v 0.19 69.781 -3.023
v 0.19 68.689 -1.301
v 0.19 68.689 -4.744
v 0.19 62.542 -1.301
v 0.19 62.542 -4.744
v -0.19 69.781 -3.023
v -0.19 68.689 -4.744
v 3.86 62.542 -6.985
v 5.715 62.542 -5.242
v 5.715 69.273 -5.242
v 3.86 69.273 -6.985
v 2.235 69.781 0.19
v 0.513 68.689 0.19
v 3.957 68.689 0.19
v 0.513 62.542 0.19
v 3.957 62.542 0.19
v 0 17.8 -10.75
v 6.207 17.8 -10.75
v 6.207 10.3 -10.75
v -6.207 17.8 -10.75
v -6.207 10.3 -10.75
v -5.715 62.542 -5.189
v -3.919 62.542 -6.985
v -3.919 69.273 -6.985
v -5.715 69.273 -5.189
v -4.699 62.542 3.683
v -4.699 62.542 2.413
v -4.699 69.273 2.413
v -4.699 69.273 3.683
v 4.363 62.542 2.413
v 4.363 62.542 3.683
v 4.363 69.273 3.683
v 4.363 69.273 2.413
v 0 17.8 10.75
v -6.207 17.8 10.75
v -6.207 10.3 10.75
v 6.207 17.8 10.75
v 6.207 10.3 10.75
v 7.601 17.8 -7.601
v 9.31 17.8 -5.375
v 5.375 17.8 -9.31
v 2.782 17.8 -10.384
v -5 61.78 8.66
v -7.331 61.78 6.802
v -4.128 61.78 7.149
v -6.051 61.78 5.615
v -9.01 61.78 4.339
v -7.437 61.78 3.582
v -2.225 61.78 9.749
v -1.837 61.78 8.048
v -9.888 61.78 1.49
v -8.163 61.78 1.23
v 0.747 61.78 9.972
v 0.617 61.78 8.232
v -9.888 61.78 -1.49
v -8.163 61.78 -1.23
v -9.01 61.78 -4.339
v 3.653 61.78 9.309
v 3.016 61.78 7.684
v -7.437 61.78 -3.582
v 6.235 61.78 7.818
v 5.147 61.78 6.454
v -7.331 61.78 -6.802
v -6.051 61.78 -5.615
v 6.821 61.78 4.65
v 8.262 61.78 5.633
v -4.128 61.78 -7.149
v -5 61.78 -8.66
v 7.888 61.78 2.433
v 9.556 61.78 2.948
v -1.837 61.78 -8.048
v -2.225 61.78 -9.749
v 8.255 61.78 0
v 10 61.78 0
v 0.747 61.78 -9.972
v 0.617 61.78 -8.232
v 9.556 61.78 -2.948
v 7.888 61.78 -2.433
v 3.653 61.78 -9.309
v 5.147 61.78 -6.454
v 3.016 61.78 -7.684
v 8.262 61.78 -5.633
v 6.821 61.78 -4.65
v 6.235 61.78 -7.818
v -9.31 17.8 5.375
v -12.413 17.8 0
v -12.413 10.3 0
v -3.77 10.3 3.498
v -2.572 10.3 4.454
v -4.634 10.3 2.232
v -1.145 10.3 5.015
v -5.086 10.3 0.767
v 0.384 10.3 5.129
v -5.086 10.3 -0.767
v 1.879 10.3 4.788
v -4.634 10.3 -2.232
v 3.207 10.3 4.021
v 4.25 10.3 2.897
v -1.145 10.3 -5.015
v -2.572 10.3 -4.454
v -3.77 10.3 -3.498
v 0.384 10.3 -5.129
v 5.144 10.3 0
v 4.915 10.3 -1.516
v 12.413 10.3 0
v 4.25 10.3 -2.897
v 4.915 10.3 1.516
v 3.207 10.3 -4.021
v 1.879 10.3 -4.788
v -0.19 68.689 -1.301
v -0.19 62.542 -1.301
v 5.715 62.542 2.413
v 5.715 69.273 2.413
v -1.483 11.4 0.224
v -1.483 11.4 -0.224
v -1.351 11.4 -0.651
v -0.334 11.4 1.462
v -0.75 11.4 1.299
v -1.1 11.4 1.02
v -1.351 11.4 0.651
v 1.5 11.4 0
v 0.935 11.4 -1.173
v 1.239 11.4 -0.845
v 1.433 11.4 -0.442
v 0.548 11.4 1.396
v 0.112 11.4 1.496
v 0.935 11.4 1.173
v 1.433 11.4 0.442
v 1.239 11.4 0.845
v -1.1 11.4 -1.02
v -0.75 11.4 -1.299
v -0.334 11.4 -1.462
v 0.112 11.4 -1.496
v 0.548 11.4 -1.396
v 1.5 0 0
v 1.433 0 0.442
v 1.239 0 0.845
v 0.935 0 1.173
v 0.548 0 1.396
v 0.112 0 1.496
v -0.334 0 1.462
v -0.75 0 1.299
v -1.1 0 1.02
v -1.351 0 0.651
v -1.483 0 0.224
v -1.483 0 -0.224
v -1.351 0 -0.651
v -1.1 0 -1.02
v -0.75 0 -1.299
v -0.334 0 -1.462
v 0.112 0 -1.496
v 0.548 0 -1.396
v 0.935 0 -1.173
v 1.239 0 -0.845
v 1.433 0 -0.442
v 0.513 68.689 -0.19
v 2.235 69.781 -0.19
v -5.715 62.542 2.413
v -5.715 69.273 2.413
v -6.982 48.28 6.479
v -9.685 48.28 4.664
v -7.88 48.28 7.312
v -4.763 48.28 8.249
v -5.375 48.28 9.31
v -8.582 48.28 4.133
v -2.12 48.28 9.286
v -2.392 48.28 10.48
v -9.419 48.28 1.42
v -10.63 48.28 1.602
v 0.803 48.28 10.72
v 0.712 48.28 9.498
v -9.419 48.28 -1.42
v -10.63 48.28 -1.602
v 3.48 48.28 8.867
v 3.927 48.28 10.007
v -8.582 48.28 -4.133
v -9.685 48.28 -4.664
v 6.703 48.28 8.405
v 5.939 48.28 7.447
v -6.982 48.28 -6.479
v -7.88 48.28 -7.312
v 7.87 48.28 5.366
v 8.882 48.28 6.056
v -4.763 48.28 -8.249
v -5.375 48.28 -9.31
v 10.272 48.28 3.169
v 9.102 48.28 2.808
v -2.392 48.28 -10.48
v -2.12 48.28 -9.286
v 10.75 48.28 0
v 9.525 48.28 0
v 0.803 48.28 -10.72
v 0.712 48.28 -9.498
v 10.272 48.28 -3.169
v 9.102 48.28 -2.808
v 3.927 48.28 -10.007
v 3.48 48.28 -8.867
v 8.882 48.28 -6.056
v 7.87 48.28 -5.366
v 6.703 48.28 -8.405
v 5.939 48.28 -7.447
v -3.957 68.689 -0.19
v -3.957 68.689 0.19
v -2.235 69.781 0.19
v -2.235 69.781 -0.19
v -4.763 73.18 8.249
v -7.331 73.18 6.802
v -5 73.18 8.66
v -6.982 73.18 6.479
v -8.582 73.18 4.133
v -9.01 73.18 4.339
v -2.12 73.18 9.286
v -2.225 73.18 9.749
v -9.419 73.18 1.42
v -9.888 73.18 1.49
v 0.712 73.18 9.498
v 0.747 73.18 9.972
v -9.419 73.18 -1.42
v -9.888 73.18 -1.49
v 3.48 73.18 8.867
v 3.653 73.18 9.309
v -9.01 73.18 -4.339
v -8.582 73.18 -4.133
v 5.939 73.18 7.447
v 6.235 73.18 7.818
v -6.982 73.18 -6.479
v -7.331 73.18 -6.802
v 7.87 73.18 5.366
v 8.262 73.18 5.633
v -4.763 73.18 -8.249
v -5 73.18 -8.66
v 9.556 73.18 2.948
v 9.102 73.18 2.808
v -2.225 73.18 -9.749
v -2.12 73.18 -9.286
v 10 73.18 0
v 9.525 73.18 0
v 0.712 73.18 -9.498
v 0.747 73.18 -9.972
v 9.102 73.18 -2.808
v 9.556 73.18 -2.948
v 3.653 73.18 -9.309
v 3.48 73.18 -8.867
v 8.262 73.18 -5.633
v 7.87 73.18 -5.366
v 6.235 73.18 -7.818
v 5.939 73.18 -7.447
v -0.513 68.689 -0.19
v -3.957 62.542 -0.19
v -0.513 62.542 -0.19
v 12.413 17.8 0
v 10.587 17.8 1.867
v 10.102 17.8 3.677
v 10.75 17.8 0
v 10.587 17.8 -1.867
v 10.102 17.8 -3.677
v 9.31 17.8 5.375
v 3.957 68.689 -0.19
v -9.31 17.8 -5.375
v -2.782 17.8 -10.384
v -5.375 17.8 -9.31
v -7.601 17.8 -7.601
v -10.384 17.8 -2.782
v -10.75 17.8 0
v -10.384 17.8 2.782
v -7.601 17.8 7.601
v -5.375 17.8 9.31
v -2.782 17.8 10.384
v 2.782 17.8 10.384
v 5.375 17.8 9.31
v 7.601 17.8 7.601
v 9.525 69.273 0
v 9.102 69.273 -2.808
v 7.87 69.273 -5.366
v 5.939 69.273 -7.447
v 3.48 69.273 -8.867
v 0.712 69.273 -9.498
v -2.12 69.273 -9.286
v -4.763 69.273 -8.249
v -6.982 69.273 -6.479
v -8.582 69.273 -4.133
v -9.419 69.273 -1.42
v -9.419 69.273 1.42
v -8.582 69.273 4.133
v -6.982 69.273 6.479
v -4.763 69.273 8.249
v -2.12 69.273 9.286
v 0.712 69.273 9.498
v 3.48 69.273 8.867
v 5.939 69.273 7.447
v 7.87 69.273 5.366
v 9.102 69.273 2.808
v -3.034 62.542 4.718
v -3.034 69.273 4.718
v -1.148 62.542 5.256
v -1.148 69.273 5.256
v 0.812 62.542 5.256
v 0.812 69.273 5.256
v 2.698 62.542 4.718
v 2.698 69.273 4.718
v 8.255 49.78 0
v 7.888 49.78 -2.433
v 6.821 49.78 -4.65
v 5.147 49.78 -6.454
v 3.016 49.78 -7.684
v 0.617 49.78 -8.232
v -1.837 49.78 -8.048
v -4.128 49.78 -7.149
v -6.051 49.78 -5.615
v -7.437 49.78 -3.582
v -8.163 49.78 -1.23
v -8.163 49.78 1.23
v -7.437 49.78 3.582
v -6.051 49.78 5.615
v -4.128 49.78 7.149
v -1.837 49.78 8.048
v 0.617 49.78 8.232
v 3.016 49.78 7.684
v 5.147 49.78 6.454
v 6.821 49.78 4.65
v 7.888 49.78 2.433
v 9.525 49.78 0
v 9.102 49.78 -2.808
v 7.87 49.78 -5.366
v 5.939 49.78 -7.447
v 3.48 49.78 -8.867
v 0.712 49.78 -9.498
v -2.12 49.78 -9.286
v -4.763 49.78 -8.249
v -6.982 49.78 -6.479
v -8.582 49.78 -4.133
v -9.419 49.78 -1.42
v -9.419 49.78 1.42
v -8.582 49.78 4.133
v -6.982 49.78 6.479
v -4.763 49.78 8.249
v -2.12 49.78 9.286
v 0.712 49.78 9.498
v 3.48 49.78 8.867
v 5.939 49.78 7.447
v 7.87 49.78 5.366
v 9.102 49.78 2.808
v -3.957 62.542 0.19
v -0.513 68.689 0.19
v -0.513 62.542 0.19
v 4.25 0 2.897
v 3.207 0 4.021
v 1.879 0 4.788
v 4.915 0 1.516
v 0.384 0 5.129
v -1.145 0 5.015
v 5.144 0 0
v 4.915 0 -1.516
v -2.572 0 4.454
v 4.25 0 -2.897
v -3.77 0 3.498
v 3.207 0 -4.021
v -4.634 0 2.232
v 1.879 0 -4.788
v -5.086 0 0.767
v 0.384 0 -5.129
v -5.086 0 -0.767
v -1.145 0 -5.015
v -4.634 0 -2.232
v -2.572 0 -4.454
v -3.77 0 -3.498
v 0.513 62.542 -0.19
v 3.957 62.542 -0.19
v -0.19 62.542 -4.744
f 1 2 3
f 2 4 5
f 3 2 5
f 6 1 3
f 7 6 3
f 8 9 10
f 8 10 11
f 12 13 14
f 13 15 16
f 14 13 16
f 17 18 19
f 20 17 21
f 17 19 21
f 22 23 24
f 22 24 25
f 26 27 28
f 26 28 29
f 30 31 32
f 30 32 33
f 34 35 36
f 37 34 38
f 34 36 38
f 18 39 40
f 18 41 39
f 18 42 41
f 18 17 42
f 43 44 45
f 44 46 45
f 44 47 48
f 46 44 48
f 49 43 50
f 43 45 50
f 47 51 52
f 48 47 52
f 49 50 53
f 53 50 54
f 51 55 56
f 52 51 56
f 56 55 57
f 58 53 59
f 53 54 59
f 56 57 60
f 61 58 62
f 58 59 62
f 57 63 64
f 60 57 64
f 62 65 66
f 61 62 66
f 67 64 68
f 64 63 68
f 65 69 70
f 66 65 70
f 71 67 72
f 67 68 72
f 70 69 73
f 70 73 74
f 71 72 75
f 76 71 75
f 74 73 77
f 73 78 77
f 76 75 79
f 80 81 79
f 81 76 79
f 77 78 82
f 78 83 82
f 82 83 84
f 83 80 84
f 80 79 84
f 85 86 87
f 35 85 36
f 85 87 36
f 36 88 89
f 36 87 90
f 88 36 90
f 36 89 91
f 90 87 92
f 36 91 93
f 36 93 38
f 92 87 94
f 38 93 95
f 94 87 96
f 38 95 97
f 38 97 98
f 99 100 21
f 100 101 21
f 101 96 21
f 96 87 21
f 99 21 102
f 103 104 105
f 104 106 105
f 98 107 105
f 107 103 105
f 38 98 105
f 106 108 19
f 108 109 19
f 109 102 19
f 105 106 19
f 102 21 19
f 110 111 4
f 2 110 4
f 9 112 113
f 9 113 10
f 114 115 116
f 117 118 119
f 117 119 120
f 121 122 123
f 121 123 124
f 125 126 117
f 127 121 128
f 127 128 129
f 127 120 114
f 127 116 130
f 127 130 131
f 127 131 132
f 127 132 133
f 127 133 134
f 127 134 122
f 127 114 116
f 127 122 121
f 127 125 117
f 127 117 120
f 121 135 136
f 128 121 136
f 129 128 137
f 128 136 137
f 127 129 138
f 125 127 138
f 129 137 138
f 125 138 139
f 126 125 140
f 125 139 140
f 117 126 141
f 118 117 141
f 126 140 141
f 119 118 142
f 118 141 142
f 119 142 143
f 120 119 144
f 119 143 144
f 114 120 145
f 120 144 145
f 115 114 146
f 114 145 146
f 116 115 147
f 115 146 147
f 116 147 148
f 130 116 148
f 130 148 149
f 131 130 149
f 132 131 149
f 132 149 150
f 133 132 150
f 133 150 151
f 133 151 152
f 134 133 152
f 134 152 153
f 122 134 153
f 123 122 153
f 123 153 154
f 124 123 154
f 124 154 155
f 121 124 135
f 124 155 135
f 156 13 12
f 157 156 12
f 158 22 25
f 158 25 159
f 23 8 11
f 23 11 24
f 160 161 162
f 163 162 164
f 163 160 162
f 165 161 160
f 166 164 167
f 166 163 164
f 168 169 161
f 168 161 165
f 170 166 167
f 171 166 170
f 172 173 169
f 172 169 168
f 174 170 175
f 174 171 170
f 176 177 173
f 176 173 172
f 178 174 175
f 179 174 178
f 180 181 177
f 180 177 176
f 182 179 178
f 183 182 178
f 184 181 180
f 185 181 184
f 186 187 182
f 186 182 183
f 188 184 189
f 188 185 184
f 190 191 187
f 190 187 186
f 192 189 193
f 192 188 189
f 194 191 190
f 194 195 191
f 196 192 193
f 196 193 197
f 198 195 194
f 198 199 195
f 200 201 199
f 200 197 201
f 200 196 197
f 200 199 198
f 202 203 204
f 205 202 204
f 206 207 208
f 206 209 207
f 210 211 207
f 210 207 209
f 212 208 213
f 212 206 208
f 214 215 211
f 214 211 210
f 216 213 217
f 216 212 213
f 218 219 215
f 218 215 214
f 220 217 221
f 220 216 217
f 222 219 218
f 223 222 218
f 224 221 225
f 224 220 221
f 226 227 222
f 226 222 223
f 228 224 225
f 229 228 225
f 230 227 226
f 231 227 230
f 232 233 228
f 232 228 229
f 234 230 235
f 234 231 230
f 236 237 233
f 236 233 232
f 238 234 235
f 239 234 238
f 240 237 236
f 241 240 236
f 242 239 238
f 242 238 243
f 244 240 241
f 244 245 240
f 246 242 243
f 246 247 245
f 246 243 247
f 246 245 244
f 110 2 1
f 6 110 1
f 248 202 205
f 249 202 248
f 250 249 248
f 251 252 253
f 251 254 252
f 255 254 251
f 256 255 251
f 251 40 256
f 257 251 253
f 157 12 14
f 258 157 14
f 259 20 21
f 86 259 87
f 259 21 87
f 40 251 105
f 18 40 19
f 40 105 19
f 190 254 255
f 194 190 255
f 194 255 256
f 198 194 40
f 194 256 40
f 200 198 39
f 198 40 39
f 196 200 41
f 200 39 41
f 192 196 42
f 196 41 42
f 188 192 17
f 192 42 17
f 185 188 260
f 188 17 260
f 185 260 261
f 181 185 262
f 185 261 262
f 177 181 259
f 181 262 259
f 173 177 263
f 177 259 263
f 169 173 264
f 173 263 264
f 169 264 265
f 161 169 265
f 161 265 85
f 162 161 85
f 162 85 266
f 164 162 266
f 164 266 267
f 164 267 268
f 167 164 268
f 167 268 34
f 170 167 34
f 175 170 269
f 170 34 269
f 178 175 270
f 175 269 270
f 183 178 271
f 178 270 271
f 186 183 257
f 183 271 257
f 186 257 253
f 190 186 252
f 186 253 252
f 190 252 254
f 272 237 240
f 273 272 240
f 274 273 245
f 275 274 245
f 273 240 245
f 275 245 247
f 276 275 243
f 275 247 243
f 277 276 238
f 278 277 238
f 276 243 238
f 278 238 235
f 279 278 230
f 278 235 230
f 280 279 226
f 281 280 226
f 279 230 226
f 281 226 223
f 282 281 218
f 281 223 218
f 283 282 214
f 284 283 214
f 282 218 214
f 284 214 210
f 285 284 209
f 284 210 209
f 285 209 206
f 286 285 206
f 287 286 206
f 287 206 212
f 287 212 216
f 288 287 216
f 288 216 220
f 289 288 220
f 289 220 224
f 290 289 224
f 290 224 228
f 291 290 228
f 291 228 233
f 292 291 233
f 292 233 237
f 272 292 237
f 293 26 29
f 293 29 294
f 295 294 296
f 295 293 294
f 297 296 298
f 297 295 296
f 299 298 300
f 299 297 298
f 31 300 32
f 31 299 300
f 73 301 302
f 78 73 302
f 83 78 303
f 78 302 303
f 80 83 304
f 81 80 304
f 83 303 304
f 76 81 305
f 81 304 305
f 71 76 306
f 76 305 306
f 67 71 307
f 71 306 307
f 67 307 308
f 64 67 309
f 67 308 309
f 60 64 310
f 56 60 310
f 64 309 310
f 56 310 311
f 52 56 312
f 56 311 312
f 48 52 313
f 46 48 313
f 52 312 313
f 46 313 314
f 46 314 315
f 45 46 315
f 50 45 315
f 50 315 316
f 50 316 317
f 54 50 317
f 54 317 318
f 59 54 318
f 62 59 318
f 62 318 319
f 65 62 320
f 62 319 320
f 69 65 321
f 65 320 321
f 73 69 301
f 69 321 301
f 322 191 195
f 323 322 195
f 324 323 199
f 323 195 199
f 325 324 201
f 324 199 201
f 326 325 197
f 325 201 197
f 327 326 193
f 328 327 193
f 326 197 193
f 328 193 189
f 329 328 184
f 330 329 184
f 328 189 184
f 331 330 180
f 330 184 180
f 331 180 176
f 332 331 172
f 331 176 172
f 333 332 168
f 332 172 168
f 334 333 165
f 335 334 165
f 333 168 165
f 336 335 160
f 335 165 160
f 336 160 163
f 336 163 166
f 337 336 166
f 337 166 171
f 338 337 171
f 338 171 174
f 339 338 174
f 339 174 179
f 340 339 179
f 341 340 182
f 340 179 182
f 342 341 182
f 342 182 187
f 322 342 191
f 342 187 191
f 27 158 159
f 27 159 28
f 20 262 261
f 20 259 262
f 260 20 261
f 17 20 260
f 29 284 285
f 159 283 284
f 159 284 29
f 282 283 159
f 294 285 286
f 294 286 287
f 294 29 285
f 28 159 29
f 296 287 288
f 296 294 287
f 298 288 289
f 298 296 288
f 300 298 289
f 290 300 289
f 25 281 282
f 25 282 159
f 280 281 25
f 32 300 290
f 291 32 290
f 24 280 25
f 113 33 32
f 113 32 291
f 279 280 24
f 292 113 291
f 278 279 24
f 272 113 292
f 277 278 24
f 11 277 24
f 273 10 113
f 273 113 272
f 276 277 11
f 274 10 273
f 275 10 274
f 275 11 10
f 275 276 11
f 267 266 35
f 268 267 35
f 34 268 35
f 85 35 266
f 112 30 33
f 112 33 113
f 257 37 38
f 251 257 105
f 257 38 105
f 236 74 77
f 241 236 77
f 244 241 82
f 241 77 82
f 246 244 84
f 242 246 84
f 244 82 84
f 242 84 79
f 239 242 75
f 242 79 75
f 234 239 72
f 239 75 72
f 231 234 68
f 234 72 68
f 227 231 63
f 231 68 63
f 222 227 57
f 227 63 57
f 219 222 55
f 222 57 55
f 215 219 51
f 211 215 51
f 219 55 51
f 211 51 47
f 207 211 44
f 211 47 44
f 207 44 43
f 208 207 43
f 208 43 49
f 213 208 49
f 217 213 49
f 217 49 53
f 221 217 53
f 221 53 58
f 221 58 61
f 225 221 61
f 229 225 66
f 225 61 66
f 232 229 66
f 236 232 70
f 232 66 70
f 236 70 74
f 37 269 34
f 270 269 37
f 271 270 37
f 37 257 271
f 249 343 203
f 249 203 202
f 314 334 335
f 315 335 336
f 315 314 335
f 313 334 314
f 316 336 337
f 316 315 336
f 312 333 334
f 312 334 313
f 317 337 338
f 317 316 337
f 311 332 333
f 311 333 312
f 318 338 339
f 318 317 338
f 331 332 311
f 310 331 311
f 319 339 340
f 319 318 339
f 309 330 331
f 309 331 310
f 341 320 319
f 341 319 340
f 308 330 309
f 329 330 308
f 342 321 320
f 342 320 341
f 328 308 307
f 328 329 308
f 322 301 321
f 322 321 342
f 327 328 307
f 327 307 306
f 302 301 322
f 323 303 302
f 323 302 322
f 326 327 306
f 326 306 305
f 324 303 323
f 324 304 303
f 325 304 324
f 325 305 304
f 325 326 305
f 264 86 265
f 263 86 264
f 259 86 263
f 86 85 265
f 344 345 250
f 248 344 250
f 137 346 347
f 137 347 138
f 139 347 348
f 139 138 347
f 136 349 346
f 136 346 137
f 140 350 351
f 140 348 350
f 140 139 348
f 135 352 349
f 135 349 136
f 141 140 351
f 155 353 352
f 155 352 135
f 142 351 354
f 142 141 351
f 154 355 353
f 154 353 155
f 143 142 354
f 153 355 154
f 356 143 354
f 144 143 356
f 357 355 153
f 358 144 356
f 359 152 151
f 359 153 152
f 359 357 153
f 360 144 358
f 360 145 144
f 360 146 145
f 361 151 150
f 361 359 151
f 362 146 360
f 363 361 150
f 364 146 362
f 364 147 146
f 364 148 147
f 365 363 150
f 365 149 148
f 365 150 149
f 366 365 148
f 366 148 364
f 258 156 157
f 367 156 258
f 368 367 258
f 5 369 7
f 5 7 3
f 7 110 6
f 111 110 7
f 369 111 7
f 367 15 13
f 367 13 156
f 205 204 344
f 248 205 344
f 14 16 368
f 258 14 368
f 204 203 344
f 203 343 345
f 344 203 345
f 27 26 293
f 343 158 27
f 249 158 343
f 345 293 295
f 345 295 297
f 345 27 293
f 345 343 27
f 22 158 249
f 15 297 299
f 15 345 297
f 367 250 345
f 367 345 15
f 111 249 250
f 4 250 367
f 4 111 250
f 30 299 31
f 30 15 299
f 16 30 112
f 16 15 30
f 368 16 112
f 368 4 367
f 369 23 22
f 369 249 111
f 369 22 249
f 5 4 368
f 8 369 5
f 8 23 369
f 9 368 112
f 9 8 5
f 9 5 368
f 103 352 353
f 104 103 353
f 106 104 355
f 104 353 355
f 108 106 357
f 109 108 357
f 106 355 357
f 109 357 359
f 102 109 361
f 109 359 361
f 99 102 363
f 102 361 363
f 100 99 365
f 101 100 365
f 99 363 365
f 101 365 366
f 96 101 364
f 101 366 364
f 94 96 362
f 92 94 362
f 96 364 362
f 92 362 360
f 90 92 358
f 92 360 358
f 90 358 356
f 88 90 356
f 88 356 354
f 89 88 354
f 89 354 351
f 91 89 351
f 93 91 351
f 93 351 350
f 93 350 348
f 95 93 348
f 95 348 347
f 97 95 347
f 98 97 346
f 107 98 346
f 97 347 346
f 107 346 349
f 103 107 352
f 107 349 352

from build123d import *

# Parameters (mm, degrees)
SKETCH1_R           = 5.1435
BOSS_EXTRUDE1_DEPTH = 10.3
BOSS_EXTRUDE2_DEPTH = 7.5
SKETCH3_R           = 10.75
BOSS_EXTRUDE3_DEPTH = 30.48
SKETCH4_R           = 9.525
BOSS_EXTRUDE4_DEPTH = 1.5
SKETCH5_R           = 8.255
BOSS_EXTRUDE5_DEPTH = 12
SKETCH6_R           = 10
BOSS_EXTRUDE6_DEPTH = 11.4
SKETCH7_R           = 4.3053
CUT_EXTRUDE1_DEPTH  = 11.4
SKETCH28_R          = 4.3053
BOSS_EXTRUDE7_DEPTH = 11.4
SKETCH29_R          = 1.5
CUT_EXTRUDE2_DEPTH  = 11.4
SKETCH30_R          = 9.525
CUT_EXTRUDE6_DEPTH  = 10.638
SKETCH31_W          = 0.381
SKETCH31_H          = 3.44369911
SKETCH31_W_2        = 3.44369911
SKETCH31_H_2        = 0.381
BOSS_EXTRUDE8_DEPTH = 7.239
CUT_EXTRUDE7_DEPTH  = 6.731
CUT_EXTRUDE8_DEPTH  = 1.651
CUT_EXTRUDE9_DEPTH  = 1.651
SKETCH35_R          = 9.525
BOSS_EXTRUDE9_DEPTH = 6.731


with BuildPart() as part:
    # Sketch1 → Boss-Extrude1 (new body)
    with BuildSketch(Plane(origin=(0, 0, 0), x_dir=(1, 0, 0), z_dir=(0, 1, 0))):
        Circle(SKETCH1_R)
    extrude(amount=BOSS_EXTRUDE1_DEPTH)

    # Sketch2 → Boss-Extrude2 (add)
    with BuildSketch(Plane(origin=(0, 10.3, 0), x_dir=(1, 0, 0), z_dir=(0, 1, 0))):
        Polygon((6.206515394, 10.75), (-6.206515394, 10.75), (-12.413030788, 0), (-6.206515394, -10.75), (6.206515394, -10.75), (12.413030788, 0), align=None)
    extrude(amount=BOSS_EXTRUDE2_DEPTH)

    # Sketch3 → Boss-Extrude3 (add)
    with BuildSketch(Plane(origin=(0, 17.8, 0), x_dir=(1, 0, 0), z_dir=(0, 1, 0))):
        Circle(SKETCH3_R)
    extrude(amount=BOSS_EXTRUDE3_DEPTH)

    # Sketch4 → Boss-Extrude4 (add)
    with BuildSketch(Plane(origin=(0, 48.28, 0), x_dir=(1, 0, 0), z_dir=(0, 1, 0))):
        Circle(SKETCH4_R)
    extrude(amount=BOSS_EXTRUDE4_DEPTH)

    # Sketch5 → Boss-Extrude5 (add)
    with BuildSketch(Plane(origin=(0, 49.78, 0), x_dir=(1, 0, 0), z_dir=(0, 1, 0))):
        Circle(SKETCH5_R)
    extrude(amount=BOSS_EXTRUDE5_DEPTH)

    # Sketch6 → Boss-Extrude6 (add)
    with BuildSketch(Plane(origin=(0, 61.78, 0), x_dir=(1, 0, 0), z_dir=(0, 1, 0))):
        Circle(SKETCH6_R)
    extrude(amount=BOSS_EXTRUDE6_DEPTH)

    # Sketch7 → Cut-Extrude1 (cut)
    with BuildSketch(Plane.XZ):
        Circle(SKETCH7_R)
    extrude(amount=-CUT_EXTRUDE1_DEPTH, mode=Mode.SUBTRACT)

    # Sketch28 → Boss-Extrude7 (add)
    with BuildSketch(Plane(origin=(0, 0, 0), x_dir=(-1, 0, 0), z_dir=(0, -1, 0))):
        Circle(SKETCH28_R)
    extrude(amount=-BOSS_EXTRUDE7_DEPTH)

    # Sketch29 → Cut-Extrude2 (cut)
    with BuildSketch(Plane.XZ):
        Circle(SKETCH29_R)
    extrude(amount=-CUT_EXTRUDE2_DEPTH, mode=Mode.SUBTRACT)

    # Sketch30 → Cut-Extrude6 (cut)
    with BuildSketch(Plane(origin=(0, 73.18, 0), x_dir=(1, 0, 0), z_dir=(0, 1, 0))):
        Circle(SKETCH30_R)
    extrude(amount=-CUT_EXTRUDE6_DEPTH, mode=Mode.SUBTRACT)

    # Sketch31 → Boss-Extrude8 (add)
    with BuildSketch(Plane(origin=(0, 62.542, 0), x_dir=(1, 0, 0), z_dir=(0, 1, 0))):
        with Locations((0, 3.0226)):
            Rectangle(SKETCH31_W, SKETCH31_H)
        with Locations((-2.2352, 0)):
            Rectangle(SKETCH31_W_2, SKETCH31_H_2)
        with Locations((2.2352, 0)):
            Rectangle(SKETCH31_W_2, SKETCH31_H_2)
    extrude(amount=BOSS_EXTRUDE8_DEPTH)

    # Sketch32 → Cut-Extrude7 (cut)
    with BuildSketch(Plane.XY.offset(0.1905)):
        Polygon((-3.957049555, 68.6888), (-2.2352, 69.781), (-3.957049555, 69.781), align=None)
        Polygon((-0.513350445, 69.781), (-2.2352, 69.781), (-0.513350445, 68.6888), align=None)
    extrude(amount=-CUT_EXTRUDE7_DEPTH, mode=Mode.SUBTRACT)

    # Sketch33 → Cut-Extrude8 (cut)
    with BuildSketch(Plane.XY.offset(0.1905)):
        Polygon((0.513350445, 68.6888), (2.2352, 69.781), (0.513350445, 69.781), align=None)
        Polygon((3.957049555, 69.781), (2.2352, 69.781), (3.957049555, 68.6888), align=None)
    extrude(amount=-CUT_EXTRUDE8_DEPTH, mode=Mode.SUBTRACT)

    # Sketch34 → Cut-Extrude9 (cut)
    with BuildSketch(Plane(origin=(0.1905, 0, 0), x_dir=(0, 0, -1), z_dir=(1, 0, 0))):
        Polygon((1.300750445, 68.6888), (3.0226, 69.781), (1.300750445, 69.781), align=None)
        Polygon((4.744449555, 69.781), (3.0226, 69.781), (4.744449555, 68.6888), align=None)
    extrude(amount=-CUT_EXTRUDE9_DEPTH, mode=Mode.SUBTRACT)

    # Sketch35 → Boss-Extrude9 (add)
    with BuildSketch(Plane(origin=(0, 62.542, 0), x_dir=(1, 0, 0), z_dir=(0, 1, 0))):
        Circle(SKETCH35_R)
        with BuildLine():
            ThreePointArc((-4.699, -3.683), (-0.167968835, -5.324730553), (4.363062329, -3.683))
            Line((4.363062329, -3.683), (4.363062329, -2.413))
            Line((4.363062329, -2.413), (5.715, -2.413))
            Line((5.715, -2.413), (5.715, 5.24229274))
            Line((5.715, 5.24229274), (3.860385896, 6.985))
            Line((3.860385896, 6.985), (-3.918948776, 6.985))
            Line((-3.918948776, 6.985), (-5.715, 5.188948776))
            Line((-5.715, 5.188948776), (-5.715, -2.413))
            Line((-5.715, -2.413), (-4.699, -2.413))
            Line((-4.699, -2.413), (-4.699, -3.683))
        make_face(mode=Mode.SUBTRACT)
    extrude(amount=BOSS_EXTRUDE9_DEPTH)


solid = part.part
